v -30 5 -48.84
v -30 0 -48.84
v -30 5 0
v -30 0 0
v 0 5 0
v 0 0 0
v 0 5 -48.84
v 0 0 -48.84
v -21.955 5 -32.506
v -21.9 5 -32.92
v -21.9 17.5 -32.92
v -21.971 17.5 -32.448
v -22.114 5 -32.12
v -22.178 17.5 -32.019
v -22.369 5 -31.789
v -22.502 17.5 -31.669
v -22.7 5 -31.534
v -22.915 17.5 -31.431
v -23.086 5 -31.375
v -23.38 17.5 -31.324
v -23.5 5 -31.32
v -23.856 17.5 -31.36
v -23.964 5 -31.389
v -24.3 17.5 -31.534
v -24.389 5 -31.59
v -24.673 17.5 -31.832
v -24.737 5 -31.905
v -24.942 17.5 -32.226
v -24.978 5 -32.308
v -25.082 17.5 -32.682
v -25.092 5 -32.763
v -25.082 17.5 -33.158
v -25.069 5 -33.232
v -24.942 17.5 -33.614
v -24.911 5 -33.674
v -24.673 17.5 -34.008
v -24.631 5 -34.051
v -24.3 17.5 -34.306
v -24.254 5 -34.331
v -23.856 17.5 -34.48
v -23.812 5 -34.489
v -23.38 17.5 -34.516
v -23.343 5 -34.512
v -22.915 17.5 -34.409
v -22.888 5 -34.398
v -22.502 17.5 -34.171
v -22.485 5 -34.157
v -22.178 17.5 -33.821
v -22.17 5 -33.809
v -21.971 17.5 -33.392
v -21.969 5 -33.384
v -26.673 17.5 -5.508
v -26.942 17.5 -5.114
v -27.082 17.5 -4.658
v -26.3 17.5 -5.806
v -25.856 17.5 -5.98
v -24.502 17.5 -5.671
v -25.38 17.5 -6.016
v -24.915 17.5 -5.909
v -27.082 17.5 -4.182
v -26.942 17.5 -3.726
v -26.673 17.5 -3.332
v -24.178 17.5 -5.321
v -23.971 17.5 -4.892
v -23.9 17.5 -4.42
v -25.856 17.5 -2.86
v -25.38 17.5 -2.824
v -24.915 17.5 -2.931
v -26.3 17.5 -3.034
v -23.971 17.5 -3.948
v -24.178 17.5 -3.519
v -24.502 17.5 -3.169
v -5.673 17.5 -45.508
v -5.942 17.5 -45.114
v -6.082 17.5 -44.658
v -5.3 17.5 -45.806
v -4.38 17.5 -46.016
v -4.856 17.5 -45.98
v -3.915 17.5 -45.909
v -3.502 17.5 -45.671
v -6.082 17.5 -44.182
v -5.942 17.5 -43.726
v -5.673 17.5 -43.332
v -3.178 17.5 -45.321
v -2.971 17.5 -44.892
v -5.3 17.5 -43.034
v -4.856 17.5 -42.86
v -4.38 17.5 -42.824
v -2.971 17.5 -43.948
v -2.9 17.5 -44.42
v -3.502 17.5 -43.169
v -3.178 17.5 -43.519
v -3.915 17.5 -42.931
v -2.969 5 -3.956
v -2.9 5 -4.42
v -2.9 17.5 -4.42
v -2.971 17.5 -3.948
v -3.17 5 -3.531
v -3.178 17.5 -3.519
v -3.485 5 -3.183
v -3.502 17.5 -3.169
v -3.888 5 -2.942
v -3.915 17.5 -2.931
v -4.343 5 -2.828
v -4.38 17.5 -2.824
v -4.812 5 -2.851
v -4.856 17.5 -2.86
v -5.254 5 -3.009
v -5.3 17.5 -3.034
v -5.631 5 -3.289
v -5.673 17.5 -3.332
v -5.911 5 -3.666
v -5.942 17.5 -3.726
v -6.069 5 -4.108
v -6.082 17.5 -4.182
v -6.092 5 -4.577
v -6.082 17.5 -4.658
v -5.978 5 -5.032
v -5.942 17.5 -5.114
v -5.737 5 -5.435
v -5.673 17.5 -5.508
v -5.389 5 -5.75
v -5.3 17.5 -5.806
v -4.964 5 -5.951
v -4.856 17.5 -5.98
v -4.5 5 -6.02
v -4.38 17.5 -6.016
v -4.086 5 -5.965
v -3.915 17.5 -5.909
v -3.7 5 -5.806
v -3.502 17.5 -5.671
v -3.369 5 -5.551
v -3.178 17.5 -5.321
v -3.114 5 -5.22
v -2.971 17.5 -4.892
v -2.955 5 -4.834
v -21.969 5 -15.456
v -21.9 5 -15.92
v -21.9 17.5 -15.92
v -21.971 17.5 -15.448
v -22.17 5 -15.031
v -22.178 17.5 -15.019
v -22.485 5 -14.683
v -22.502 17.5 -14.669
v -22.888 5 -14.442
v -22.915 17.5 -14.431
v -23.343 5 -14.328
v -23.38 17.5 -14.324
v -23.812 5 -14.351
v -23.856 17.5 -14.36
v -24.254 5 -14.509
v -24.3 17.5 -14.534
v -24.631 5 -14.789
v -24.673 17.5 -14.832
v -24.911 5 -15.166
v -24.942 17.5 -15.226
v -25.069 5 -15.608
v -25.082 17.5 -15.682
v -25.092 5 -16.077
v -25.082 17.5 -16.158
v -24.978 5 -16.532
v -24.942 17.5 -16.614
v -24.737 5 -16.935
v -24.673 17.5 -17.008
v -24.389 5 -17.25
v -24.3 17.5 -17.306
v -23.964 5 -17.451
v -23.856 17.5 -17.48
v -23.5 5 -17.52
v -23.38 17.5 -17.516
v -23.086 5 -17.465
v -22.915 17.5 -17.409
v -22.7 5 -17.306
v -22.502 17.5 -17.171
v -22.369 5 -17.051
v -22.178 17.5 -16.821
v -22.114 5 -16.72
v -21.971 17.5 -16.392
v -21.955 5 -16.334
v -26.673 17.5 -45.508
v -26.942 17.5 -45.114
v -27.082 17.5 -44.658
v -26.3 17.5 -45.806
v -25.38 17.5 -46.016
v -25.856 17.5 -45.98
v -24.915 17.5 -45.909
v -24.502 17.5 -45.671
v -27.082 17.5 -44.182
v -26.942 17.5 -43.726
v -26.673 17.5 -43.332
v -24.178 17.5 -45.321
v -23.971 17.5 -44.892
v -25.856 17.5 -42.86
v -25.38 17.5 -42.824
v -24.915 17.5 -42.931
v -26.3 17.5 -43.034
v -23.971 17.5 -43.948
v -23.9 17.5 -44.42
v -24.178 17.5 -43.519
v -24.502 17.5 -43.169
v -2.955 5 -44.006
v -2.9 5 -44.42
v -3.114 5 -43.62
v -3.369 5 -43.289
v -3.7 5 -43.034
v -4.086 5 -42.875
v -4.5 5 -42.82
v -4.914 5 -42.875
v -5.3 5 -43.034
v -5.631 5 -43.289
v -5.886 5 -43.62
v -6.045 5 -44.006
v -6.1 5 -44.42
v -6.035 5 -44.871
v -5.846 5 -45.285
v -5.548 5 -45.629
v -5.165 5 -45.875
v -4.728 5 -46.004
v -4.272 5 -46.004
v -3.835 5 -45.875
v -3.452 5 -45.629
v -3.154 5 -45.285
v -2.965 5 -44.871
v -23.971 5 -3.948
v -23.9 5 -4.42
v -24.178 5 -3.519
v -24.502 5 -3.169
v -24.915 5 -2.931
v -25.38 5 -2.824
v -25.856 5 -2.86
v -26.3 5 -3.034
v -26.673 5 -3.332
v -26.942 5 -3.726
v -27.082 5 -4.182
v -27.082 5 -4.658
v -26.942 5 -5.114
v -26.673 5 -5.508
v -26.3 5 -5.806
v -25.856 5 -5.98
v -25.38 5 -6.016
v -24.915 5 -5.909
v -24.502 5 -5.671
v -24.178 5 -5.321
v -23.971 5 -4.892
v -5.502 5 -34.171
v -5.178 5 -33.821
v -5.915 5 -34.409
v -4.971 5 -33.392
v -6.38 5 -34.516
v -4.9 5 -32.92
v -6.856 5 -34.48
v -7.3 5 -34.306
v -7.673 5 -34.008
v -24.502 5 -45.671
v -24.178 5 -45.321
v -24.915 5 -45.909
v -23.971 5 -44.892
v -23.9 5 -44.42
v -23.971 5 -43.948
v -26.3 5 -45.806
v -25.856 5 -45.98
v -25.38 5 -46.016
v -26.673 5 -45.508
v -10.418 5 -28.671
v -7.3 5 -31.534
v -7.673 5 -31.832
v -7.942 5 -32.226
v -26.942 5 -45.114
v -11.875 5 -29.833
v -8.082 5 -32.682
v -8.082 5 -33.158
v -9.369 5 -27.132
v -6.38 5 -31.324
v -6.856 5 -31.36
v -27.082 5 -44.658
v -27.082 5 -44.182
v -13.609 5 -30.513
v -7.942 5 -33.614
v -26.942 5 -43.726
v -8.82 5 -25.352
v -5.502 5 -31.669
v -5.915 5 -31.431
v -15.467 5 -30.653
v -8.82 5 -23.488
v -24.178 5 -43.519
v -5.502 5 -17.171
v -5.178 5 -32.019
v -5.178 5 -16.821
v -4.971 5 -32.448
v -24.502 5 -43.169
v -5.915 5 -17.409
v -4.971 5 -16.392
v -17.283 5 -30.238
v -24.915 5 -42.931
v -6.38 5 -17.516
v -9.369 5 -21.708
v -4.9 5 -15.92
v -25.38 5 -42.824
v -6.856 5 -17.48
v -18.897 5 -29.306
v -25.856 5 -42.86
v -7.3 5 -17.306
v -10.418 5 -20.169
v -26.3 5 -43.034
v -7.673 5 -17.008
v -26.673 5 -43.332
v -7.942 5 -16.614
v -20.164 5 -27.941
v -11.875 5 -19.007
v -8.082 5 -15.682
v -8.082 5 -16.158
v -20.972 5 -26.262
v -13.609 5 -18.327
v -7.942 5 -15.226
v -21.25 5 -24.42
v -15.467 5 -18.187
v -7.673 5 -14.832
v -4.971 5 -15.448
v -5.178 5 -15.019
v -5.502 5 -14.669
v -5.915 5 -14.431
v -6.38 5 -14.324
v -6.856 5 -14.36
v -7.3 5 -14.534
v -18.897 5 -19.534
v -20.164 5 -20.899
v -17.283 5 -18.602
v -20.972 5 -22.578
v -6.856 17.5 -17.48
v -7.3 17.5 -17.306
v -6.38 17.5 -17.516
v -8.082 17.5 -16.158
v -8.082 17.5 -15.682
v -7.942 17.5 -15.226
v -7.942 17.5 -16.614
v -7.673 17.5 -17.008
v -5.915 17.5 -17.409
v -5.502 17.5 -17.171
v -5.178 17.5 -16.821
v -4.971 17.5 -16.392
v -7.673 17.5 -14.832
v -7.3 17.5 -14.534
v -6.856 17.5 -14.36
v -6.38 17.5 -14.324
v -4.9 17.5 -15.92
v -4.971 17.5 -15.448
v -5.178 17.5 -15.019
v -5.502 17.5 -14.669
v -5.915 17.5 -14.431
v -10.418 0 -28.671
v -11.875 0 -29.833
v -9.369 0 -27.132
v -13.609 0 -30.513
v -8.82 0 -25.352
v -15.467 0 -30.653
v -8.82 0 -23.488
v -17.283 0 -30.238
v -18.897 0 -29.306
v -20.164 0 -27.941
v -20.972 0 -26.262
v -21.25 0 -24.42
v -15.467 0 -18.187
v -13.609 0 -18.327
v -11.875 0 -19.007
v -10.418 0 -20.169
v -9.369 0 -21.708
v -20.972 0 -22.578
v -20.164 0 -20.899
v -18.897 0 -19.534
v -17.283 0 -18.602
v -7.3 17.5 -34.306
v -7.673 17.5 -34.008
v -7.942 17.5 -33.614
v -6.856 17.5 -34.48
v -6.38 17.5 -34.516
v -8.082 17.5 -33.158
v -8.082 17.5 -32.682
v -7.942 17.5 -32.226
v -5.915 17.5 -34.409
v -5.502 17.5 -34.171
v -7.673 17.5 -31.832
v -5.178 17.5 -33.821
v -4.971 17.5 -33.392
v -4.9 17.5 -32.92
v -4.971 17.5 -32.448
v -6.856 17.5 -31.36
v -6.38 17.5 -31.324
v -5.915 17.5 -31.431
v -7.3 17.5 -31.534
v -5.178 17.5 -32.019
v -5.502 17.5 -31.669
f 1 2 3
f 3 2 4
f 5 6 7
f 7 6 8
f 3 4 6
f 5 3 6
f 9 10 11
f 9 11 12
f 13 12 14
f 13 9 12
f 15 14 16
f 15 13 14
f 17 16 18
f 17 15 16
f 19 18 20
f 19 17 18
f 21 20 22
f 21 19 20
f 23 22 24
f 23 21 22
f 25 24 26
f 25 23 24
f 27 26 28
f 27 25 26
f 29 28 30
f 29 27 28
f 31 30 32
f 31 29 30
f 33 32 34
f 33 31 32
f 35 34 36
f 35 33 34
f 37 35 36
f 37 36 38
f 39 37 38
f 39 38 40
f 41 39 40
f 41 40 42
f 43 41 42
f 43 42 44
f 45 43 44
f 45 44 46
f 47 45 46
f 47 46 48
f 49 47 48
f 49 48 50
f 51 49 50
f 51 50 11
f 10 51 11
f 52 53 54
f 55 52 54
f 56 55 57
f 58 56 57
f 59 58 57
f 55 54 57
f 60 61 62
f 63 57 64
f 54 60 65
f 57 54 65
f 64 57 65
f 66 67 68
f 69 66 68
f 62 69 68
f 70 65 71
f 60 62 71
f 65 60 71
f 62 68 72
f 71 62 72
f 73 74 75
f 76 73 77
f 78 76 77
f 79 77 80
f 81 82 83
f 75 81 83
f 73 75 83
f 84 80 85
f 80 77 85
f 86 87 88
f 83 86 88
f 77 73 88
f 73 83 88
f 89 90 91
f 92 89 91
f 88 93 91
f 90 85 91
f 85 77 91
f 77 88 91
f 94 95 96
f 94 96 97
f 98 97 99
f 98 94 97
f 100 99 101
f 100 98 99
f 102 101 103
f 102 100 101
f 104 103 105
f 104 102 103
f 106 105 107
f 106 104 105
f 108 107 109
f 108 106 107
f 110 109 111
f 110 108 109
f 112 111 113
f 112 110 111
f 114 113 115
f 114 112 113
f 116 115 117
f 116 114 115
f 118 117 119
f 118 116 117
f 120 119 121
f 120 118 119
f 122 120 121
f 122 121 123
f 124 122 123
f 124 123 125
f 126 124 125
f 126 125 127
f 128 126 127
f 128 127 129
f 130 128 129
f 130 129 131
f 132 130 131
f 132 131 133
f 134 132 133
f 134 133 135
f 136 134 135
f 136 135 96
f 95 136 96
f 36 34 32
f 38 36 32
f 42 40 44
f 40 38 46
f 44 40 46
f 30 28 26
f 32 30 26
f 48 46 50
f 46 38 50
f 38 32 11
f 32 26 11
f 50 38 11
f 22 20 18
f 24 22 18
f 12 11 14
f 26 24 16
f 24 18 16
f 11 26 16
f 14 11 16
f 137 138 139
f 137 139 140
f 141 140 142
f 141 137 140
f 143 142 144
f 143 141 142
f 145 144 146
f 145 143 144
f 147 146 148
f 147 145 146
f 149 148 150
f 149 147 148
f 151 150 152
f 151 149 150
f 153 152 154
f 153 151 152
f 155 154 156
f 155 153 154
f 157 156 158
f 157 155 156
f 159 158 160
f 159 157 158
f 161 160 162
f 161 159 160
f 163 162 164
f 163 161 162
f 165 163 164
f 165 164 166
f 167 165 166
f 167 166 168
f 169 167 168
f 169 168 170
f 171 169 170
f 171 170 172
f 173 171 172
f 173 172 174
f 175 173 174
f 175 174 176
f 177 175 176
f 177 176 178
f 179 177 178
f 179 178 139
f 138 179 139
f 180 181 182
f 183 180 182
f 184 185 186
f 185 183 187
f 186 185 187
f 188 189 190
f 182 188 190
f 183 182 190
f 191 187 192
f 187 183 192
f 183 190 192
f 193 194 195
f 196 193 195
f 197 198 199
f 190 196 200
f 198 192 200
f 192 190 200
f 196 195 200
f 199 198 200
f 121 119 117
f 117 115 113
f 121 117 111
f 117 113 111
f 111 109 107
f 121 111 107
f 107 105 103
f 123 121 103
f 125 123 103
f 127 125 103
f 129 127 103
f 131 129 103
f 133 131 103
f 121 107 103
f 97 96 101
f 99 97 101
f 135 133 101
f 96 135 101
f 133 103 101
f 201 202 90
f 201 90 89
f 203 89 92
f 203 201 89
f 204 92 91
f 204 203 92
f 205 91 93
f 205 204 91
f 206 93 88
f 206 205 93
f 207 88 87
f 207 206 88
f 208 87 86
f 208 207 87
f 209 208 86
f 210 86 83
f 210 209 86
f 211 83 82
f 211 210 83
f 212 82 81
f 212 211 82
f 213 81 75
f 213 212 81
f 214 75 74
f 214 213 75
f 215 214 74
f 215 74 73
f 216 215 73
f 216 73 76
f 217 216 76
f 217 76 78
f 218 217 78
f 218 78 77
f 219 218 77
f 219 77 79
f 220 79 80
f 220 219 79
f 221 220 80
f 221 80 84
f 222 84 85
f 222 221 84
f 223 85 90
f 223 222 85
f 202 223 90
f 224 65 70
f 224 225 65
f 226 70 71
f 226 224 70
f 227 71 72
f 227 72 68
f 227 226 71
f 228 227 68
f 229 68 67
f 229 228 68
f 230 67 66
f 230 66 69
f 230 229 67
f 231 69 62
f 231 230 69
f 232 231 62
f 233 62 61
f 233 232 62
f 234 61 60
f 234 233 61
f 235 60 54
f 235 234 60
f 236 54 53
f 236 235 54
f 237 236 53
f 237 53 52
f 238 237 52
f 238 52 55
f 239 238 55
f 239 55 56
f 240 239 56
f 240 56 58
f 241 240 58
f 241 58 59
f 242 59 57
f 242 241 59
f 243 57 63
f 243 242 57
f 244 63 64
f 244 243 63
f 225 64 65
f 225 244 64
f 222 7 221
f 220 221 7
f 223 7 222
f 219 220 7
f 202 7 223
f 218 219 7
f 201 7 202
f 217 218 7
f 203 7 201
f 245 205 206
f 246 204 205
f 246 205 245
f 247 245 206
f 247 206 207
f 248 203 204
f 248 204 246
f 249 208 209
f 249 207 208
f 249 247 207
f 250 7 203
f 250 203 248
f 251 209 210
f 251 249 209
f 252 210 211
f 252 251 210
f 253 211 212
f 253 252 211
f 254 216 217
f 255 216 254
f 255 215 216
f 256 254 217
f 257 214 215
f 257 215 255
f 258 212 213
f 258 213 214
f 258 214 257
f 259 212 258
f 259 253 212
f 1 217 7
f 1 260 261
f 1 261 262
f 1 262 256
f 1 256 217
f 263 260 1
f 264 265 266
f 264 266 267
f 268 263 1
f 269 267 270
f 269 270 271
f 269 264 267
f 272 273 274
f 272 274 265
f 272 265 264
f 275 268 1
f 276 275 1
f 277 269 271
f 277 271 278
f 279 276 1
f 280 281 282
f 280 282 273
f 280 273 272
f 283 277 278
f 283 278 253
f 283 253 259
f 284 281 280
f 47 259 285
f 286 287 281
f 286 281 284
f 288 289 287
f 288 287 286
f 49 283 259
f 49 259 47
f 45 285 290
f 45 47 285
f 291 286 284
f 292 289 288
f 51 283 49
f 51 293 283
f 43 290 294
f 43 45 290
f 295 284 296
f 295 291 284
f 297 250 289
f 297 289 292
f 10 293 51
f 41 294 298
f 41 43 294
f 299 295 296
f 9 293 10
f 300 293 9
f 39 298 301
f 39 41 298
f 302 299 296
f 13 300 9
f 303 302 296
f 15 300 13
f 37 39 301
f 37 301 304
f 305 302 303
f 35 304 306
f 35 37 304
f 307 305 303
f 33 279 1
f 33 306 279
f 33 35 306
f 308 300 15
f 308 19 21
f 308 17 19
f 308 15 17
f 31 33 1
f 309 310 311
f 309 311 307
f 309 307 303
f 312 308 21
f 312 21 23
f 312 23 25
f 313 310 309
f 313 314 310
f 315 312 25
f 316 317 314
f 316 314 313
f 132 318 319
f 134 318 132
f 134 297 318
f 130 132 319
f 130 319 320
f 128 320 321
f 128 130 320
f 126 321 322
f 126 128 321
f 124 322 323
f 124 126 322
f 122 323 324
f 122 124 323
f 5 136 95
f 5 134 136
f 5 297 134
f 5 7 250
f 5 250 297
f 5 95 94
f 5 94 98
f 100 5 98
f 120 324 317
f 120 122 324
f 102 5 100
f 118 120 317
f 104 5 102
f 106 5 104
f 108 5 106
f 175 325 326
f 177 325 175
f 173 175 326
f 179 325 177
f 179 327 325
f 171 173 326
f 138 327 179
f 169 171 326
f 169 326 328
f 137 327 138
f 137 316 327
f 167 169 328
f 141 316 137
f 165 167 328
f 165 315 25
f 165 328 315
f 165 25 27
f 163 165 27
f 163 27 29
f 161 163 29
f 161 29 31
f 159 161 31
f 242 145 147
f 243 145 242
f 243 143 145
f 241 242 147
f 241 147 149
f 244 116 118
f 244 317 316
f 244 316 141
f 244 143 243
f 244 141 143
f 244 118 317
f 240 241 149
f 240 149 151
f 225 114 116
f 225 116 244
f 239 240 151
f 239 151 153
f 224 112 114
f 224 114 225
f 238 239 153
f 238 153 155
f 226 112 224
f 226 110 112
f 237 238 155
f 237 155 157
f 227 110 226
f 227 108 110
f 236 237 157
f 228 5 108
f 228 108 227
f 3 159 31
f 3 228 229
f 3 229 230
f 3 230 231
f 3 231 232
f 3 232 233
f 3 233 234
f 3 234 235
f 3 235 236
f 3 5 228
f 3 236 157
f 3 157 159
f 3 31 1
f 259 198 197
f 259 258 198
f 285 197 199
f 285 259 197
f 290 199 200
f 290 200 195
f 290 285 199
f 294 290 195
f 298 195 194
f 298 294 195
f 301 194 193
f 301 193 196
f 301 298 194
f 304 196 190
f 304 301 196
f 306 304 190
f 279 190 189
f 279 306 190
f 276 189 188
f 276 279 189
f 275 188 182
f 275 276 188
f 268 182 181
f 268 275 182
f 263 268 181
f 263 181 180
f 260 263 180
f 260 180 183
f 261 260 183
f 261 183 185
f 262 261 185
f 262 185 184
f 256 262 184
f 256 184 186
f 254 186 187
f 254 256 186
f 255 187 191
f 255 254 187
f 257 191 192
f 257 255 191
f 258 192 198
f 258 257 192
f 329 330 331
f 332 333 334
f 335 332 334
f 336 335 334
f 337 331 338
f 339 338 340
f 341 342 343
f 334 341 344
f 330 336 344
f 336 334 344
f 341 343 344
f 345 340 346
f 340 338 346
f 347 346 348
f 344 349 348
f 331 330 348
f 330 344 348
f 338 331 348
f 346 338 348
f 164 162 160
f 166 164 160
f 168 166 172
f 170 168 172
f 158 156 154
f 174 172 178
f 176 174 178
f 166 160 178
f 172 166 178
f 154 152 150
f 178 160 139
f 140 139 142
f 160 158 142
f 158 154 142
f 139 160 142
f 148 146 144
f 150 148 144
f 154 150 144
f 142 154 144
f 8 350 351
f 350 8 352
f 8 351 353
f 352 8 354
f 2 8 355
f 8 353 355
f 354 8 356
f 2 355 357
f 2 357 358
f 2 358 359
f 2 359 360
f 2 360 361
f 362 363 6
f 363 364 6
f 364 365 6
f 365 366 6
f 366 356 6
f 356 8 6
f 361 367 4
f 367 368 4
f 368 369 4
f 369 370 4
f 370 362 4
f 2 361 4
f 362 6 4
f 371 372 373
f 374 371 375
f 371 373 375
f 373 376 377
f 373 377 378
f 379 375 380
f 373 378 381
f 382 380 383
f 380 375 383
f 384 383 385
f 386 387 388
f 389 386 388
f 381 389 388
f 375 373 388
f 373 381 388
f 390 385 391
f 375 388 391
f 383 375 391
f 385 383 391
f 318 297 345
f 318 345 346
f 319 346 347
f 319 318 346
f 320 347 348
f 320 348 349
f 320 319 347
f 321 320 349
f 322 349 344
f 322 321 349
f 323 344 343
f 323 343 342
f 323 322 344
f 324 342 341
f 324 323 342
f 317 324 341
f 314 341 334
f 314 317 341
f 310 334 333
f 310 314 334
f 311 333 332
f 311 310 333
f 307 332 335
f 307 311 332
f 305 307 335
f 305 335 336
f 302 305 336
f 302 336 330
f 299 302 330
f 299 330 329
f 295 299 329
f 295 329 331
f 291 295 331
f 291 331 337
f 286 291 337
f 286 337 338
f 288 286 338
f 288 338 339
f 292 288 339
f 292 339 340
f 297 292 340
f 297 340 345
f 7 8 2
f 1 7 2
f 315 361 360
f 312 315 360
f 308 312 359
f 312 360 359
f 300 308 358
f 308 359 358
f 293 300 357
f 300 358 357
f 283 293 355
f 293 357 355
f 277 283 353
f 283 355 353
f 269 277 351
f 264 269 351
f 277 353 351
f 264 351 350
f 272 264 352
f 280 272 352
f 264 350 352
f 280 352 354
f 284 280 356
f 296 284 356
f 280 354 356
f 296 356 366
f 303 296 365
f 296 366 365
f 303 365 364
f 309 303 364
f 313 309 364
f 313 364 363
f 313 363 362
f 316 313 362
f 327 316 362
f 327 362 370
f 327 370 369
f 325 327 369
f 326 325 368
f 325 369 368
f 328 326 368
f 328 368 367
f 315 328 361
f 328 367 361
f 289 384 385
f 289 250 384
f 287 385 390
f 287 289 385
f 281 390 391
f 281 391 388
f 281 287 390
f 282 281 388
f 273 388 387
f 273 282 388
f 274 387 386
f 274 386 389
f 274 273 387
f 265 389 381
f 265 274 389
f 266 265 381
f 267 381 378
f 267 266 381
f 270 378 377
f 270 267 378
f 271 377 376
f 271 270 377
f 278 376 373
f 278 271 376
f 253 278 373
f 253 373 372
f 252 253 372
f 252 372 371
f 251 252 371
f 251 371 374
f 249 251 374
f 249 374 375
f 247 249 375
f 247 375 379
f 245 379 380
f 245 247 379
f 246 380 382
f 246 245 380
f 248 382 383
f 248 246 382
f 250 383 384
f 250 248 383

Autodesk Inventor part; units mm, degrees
ref_plane "YZ Plane" through (0, 0, 0) normal (1, 0, 0) x (0, 1, 0)
ref_plane "XZ Plane" through (0, 0, 0) normal (0, 1, 0) x (-1, 0, 0)
ref_plane "XY Plane" through (0, 0, 0) normal (0, 0, 1) x (1, 0, 0)
sketch "Sketch1" plane through (0, 0, 0) normal (0, 1, 0) x (-1, 0, 0)
  line L0 (0, 0) -> (0, -48.84)
  line L1 (0, -48.84) -> (30, -48.84)
  line L2 (30, -48.84) -> (30, 0)
  line L3 (30, 0) -> (0, 0)
  circle A0 centre (4.5, -44.42) radius 1.6
  circle A1 centre (25.5, -44.42) radius 1.6
  circle A2 centre (15, -24.42) radius 6.25
  circle A3 centre (6.5, -32.92) radius 1.6
  circle A4 centre (23.5, -32.92) radius 1.6
  circle A5 centre (6.5, -15.92) radius 1.6
  circle A6 centre (23.5, -15.92) radius 1.6
  circle A7 centre (4.5, -4.42) radius 1.6
  circle A8 centre (25.5, -4.42) radius 1.6
  line L4 (23.5, -32.92) -> (23.5, -15.92)
  line L5 (23.5, -24.42) -> (6.5, -24.42)
  line L6 (25.5, -44.42) -> (4.5, -44.42)
  line L7 (4.5, -44.42) -> (4.5, -4.42)
  point P0 (30, -24.42)
  point P1 (15, -48.84)
  point P2 (15, -24.42)
  point P3 (4.5, -24.42)
  point P4 (0, -24.42)
  point P5 (15, -44.42)
  dimension "d0" = 48.84
  dimension "d1" = 30
  dimension "d2" = 12.5
  dimension "d3" = 17
  dimension "d4" = 17
  dimension "d5" = 3.2
  dimension "d6" = 21
  dimension "d7" = 40
extrude "Extrusion1" add sketch "Sketch1" along normal blind 5
sketch "Sketch2" plane through (0, 0, 0) normal (0, -1, 0) x (1, 0, 0)
  circle A0 centre (-23.5, -15.92) radius 1.6 construction
  circle A1 centre (-4.5, -4.42) radius 1.6 construction
  circle A2 centre (-25.5, -44.42) radius 1.6 construction
  circle A3 centre (-25.5, -4.42) radius 1.6 construction
  circle A4 centre (-4.5, -44.42) radius 1.6 construction
  circle A5 centre (-6.5, -32.92) radius 1.6 construction
  circle A6 centre (-23.5, -32.92) radius 1.6 construction
  circle A7 centre (-6.5, -15.92) radius 1.6 construction
  circle A8 centre (-4.5, -44.42) radius 1.6
  circle A9 centre (-6.5, -32.92) radius 1.6
  circle A10 centre (-6.5, -15.92) radius 1.6
  circle A11 centre (-4.5, -4.42) radius 1.6
  circle A12 centre (-25.5, -4.42) radius 1.6
  circle A13 centre (-23.5, -15.92) radius 1.6
  circle A14 centre (-23.5, -32.92) radius 1.6
  circle A15 centre (-25.5, -44.42) radius 1.6
extrude "Extrusion2" add sketch "Sketch2" against normal blind 17.5
properties part number "Plate"
